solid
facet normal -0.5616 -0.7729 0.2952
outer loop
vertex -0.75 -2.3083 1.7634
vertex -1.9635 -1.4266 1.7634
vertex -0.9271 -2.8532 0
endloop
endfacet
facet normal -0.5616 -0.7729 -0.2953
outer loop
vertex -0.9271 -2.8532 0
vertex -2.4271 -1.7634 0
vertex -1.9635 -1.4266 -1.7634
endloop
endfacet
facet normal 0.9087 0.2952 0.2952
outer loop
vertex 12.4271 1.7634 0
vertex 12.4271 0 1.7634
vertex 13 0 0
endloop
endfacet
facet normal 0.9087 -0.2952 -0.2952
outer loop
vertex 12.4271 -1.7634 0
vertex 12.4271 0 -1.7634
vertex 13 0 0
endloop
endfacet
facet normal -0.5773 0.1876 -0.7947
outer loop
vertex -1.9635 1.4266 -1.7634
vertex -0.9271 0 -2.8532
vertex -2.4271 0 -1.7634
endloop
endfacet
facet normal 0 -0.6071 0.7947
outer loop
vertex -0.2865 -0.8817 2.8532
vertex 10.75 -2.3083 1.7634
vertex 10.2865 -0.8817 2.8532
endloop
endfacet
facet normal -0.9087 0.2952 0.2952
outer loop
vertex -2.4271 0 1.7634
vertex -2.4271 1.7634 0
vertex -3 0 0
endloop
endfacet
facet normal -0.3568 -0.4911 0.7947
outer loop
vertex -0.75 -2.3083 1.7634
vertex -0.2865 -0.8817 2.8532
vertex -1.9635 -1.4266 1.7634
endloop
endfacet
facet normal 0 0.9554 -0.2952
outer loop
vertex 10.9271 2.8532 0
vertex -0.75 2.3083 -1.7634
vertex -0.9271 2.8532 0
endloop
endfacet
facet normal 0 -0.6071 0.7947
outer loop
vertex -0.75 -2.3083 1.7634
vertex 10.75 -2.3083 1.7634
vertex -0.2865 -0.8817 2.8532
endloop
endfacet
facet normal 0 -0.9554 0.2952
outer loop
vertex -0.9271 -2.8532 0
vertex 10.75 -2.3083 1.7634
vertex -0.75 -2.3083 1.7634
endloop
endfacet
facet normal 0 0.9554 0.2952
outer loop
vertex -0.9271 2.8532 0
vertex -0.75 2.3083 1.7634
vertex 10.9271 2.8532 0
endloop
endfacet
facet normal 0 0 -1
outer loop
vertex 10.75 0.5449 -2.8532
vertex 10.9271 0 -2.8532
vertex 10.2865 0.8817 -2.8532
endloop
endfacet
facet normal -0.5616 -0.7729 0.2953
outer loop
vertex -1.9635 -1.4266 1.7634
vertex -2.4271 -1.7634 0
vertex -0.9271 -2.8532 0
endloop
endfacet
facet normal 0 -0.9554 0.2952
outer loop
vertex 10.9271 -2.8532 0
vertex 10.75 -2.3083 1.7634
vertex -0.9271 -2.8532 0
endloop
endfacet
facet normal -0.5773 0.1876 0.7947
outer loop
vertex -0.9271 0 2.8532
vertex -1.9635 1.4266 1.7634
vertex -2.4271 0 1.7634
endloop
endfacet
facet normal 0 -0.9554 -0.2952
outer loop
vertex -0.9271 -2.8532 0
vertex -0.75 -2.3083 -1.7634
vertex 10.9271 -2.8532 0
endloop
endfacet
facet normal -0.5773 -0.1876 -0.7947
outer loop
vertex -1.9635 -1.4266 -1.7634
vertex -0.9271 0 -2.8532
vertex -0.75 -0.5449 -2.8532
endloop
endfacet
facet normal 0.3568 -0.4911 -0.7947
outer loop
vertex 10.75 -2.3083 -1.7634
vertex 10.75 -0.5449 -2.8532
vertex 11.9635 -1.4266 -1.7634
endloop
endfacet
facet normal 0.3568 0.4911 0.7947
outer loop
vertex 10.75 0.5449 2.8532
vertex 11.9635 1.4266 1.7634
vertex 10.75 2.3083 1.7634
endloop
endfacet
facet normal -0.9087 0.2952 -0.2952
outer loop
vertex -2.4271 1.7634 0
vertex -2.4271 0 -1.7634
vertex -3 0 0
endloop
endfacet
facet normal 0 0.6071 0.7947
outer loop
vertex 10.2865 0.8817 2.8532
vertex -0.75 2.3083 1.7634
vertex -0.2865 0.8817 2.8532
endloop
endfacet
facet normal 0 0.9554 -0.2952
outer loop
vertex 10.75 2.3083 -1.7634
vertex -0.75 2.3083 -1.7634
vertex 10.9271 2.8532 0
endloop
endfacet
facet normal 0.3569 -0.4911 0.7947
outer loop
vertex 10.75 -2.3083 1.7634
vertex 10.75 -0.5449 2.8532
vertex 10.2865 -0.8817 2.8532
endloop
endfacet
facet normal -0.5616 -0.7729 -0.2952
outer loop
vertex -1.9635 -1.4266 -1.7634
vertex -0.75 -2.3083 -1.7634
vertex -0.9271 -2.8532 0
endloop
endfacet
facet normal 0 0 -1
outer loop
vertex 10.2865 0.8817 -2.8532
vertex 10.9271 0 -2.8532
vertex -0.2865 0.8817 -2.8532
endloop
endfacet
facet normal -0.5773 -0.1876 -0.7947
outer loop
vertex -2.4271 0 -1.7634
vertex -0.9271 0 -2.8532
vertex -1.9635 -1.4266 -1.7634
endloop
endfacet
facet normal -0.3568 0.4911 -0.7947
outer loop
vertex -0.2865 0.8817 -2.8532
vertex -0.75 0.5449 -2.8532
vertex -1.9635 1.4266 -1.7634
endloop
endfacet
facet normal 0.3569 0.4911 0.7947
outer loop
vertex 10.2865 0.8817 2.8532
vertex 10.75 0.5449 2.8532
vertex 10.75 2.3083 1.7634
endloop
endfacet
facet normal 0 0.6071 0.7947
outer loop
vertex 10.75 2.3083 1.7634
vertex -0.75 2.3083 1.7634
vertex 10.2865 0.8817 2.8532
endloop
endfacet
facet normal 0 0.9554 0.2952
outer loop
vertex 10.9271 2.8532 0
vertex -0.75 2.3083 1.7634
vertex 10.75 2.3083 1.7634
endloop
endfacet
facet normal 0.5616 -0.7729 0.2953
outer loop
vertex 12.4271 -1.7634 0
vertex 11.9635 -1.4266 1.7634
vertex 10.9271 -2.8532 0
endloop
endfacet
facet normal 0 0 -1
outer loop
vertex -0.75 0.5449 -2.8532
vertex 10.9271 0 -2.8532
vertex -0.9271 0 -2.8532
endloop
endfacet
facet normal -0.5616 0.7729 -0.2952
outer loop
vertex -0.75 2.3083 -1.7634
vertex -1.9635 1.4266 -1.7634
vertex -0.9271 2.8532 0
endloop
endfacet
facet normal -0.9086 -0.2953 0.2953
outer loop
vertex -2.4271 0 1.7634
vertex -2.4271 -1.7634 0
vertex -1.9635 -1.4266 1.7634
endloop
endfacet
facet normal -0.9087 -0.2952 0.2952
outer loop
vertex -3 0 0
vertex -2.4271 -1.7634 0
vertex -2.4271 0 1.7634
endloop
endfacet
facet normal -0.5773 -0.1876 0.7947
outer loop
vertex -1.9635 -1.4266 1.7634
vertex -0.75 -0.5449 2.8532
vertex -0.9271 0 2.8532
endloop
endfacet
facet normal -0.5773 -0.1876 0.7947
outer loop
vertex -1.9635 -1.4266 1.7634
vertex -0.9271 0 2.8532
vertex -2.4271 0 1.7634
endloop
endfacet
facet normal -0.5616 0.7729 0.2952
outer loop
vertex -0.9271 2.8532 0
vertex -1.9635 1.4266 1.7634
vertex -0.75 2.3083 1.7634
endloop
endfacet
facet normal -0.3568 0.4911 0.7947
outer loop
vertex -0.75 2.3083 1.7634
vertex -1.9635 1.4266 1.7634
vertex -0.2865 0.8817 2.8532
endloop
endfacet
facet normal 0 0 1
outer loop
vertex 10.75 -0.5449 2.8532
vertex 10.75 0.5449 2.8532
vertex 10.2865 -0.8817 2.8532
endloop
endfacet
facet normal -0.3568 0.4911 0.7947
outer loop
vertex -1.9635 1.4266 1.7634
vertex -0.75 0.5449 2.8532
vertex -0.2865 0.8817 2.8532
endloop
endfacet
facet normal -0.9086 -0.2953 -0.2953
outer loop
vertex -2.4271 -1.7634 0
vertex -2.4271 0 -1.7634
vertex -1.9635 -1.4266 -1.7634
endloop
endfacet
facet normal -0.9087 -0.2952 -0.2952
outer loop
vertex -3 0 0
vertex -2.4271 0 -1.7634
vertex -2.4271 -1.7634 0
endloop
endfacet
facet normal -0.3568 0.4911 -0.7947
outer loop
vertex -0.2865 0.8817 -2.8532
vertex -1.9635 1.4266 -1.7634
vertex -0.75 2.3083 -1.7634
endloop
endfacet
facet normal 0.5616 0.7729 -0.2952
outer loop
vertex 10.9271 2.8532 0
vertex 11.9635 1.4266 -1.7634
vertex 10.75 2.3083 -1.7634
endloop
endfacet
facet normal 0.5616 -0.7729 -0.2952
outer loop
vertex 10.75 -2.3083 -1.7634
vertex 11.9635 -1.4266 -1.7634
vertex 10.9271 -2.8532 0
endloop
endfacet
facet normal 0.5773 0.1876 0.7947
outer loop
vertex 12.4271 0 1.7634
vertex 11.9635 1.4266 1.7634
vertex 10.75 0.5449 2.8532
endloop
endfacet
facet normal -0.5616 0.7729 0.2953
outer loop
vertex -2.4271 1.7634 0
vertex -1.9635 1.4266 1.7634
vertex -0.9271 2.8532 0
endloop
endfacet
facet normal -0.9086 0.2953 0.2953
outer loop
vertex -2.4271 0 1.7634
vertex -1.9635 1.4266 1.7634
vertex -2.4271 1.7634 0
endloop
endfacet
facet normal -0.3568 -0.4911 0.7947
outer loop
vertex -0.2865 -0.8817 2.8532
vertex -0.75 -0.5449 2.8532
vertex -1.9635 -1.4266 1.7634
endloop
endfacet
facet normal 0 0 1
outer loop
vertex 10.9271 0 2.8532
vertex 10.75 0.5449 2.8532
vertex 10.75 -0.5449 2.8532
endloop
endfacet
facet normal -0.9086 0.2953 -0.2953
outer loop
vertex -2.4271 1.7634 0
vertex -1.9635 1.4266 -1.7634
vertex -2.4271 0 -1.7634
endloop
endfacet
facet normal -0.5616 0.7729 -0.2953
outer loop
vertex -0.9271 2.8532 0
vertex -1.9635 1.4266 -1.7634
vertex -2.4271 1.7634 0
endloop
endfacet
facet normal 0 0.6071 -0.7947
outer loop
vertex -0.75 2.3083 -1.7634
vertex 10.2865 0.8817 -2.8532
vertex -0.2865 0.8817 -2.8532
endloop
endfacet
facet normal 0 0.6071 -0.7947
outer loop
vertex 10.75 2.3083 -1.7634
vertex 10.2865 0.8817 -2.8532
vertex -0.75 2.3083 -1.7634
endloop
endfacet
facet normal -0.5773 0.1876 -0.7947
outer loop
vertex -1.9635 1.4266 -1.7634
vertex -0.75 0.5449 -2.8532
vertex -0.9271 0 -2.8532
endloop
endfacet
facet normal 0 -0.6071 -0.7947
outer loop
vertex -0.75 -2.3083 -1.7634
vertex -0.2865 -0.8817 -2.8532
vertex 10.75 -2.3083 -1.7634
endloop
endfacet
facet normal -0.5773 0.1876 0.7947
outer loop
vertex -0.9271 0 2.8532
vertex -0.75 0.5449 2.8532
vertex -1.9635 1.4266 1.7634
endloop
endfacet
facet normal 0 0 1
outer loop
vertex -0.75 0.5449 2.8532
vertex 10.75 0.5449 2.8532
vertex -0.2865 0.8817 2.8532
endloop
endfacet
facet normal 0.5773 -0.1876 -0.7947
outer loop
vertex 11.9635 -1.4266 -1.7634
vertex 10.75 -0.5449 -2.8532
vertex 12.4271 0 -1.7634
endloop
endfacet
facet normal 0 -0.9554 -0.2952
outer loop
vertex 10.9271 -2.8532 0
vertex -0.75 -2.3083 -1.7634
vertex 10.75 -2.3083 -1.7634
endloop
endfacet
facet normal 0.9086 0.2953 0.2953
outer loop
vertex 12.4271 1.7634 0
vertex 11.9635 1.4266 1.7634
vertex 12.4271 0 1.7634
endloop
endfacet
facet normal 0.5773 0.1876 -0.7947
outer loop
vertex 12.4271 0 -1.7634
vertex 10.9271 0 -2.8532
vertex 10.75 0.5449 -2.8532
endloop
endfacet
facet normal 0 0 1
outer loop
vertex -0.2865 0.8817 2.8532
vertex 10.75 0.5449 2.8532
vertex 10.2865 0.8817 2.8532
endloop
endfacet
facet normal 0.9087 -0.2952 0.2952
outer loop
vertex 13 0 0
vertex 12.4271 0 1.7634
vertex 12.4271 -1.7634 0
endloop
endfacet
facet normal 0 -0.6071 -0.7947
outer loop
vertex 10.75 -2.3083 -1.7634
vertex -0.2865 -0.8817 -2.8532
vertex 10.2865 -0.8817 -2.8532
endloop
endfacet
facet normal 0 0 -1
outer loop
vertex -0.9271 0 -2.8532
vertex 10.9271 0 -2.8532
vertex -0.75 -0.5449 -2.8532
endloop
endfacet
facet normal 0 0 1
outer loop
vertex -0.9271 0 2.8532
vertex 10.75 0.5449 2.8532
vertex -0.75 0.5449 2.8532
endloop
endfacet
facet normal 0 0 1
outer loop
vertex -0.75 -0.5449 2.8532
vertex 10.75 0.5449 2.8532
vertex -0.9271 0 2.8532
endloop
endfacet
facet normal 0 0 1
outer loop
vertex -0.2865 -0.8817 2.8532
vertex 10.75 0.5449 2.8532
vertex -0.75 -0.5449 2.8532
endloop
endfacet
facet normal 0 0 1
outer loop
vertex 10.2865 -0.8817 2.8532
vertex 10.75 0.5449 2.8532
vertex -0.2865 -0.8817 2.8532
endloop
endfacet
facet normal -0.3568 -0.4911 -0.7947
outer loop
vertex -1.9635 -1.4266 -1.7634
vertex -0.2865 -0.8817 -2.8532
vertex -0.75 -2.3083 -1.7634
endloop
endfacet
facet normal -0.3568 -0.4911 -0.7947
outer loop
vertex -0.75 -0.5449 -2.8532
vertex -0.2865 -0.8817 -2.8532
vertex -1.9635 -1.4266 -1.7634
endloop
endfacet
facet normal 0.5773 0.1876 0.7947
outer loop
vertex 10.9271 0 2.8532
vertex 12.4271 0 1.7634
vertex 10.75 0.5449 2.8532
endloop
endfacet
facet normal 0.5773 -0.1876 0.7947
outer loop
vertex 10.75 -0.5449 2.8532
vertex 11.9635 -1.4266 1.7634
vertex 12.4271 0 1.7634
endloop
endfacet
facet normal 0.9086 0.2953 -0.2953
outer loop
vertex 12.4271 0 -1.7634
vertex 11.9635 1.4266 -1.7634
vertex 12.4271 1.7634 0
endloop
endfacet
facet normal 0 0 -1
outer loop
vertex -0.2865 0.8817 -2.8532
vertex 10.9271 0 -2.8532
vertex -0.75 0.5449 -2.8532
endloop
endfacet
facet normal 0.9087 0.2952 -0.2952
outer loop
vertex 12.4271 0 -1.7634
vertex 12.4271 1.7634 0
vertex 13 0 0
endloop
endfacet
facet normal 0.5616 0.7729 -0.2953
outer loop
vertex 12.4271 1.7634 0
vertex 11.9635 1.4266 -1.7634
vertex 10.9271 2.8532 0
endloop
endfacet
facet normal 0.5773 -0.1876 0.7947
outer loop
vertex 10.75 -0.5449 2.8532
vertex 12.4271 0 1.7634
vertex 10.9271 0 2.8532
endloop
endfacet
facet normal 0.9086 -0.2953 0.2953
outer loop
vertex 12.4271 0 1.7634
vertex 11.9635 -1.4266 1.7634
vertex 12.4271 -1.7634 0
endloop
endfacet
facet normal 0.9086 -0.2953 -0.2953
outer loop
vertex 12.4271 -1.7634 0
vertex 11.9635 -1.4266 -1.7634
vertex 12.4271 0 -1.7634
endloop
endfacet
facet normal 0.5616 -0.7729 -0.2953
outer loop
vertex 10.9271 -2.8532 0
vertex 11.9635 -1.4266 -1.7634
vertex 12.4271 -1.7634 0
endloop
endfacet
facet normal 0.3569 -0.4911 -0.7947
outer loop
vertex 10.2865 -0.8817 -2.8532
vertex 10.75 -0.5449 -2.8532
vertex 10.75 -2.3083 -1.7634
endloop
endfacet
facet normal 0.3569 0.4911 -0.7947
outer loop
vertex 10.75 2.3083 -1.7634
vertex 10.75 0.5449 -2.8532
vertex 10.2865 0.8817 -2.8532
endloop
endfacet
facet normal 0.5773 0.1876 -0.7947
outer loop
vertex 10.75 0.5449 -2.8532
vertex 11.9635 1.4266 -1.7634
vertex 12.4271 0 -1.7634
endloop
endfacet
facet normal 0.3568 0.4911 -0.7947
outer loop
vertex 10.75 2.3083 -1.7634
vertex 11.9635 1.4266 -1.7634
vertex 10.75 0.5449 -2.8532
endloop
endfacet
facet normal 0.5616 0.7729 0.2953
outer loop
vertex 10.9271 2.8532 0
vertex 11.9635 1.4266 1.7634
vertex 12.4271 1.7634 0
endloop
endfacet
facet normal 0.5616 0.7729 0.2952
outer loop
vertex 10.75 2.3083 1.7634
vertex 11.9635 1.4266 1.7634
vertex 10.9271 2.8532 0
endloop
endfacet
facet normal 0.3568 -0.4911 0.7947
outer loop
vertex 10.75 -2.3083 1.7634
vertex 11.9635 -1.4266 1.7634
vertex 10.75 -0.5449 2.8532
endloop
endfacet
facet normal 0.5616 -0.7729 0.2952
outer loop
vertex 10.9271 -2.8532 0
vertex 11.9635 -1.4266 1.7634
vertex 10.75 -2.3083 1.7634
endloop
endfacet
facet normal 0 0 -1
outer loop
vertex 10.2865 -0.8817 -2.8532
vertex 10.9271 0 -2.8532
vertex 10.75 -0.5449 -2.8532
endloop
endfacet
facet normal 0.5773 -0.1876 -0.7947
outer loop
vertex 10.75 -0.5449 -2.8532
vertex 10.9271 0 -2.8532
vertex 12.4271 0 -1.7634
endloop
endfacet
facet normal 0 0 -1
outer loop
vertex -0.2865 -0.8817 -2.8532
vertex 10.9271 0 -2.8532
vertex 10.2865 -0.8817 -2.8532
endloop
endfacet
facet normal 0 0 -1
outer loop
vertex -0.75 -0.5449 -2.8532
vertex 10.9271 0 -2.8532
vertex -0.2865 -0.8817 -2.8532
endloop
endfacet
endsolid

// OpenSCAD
// Module that hulls pairs of children
module hull_children() {
    hull() children();
}

hull_children() {
    sphere(3);
    translate([10, 0, 0]) sphere(3);
}
